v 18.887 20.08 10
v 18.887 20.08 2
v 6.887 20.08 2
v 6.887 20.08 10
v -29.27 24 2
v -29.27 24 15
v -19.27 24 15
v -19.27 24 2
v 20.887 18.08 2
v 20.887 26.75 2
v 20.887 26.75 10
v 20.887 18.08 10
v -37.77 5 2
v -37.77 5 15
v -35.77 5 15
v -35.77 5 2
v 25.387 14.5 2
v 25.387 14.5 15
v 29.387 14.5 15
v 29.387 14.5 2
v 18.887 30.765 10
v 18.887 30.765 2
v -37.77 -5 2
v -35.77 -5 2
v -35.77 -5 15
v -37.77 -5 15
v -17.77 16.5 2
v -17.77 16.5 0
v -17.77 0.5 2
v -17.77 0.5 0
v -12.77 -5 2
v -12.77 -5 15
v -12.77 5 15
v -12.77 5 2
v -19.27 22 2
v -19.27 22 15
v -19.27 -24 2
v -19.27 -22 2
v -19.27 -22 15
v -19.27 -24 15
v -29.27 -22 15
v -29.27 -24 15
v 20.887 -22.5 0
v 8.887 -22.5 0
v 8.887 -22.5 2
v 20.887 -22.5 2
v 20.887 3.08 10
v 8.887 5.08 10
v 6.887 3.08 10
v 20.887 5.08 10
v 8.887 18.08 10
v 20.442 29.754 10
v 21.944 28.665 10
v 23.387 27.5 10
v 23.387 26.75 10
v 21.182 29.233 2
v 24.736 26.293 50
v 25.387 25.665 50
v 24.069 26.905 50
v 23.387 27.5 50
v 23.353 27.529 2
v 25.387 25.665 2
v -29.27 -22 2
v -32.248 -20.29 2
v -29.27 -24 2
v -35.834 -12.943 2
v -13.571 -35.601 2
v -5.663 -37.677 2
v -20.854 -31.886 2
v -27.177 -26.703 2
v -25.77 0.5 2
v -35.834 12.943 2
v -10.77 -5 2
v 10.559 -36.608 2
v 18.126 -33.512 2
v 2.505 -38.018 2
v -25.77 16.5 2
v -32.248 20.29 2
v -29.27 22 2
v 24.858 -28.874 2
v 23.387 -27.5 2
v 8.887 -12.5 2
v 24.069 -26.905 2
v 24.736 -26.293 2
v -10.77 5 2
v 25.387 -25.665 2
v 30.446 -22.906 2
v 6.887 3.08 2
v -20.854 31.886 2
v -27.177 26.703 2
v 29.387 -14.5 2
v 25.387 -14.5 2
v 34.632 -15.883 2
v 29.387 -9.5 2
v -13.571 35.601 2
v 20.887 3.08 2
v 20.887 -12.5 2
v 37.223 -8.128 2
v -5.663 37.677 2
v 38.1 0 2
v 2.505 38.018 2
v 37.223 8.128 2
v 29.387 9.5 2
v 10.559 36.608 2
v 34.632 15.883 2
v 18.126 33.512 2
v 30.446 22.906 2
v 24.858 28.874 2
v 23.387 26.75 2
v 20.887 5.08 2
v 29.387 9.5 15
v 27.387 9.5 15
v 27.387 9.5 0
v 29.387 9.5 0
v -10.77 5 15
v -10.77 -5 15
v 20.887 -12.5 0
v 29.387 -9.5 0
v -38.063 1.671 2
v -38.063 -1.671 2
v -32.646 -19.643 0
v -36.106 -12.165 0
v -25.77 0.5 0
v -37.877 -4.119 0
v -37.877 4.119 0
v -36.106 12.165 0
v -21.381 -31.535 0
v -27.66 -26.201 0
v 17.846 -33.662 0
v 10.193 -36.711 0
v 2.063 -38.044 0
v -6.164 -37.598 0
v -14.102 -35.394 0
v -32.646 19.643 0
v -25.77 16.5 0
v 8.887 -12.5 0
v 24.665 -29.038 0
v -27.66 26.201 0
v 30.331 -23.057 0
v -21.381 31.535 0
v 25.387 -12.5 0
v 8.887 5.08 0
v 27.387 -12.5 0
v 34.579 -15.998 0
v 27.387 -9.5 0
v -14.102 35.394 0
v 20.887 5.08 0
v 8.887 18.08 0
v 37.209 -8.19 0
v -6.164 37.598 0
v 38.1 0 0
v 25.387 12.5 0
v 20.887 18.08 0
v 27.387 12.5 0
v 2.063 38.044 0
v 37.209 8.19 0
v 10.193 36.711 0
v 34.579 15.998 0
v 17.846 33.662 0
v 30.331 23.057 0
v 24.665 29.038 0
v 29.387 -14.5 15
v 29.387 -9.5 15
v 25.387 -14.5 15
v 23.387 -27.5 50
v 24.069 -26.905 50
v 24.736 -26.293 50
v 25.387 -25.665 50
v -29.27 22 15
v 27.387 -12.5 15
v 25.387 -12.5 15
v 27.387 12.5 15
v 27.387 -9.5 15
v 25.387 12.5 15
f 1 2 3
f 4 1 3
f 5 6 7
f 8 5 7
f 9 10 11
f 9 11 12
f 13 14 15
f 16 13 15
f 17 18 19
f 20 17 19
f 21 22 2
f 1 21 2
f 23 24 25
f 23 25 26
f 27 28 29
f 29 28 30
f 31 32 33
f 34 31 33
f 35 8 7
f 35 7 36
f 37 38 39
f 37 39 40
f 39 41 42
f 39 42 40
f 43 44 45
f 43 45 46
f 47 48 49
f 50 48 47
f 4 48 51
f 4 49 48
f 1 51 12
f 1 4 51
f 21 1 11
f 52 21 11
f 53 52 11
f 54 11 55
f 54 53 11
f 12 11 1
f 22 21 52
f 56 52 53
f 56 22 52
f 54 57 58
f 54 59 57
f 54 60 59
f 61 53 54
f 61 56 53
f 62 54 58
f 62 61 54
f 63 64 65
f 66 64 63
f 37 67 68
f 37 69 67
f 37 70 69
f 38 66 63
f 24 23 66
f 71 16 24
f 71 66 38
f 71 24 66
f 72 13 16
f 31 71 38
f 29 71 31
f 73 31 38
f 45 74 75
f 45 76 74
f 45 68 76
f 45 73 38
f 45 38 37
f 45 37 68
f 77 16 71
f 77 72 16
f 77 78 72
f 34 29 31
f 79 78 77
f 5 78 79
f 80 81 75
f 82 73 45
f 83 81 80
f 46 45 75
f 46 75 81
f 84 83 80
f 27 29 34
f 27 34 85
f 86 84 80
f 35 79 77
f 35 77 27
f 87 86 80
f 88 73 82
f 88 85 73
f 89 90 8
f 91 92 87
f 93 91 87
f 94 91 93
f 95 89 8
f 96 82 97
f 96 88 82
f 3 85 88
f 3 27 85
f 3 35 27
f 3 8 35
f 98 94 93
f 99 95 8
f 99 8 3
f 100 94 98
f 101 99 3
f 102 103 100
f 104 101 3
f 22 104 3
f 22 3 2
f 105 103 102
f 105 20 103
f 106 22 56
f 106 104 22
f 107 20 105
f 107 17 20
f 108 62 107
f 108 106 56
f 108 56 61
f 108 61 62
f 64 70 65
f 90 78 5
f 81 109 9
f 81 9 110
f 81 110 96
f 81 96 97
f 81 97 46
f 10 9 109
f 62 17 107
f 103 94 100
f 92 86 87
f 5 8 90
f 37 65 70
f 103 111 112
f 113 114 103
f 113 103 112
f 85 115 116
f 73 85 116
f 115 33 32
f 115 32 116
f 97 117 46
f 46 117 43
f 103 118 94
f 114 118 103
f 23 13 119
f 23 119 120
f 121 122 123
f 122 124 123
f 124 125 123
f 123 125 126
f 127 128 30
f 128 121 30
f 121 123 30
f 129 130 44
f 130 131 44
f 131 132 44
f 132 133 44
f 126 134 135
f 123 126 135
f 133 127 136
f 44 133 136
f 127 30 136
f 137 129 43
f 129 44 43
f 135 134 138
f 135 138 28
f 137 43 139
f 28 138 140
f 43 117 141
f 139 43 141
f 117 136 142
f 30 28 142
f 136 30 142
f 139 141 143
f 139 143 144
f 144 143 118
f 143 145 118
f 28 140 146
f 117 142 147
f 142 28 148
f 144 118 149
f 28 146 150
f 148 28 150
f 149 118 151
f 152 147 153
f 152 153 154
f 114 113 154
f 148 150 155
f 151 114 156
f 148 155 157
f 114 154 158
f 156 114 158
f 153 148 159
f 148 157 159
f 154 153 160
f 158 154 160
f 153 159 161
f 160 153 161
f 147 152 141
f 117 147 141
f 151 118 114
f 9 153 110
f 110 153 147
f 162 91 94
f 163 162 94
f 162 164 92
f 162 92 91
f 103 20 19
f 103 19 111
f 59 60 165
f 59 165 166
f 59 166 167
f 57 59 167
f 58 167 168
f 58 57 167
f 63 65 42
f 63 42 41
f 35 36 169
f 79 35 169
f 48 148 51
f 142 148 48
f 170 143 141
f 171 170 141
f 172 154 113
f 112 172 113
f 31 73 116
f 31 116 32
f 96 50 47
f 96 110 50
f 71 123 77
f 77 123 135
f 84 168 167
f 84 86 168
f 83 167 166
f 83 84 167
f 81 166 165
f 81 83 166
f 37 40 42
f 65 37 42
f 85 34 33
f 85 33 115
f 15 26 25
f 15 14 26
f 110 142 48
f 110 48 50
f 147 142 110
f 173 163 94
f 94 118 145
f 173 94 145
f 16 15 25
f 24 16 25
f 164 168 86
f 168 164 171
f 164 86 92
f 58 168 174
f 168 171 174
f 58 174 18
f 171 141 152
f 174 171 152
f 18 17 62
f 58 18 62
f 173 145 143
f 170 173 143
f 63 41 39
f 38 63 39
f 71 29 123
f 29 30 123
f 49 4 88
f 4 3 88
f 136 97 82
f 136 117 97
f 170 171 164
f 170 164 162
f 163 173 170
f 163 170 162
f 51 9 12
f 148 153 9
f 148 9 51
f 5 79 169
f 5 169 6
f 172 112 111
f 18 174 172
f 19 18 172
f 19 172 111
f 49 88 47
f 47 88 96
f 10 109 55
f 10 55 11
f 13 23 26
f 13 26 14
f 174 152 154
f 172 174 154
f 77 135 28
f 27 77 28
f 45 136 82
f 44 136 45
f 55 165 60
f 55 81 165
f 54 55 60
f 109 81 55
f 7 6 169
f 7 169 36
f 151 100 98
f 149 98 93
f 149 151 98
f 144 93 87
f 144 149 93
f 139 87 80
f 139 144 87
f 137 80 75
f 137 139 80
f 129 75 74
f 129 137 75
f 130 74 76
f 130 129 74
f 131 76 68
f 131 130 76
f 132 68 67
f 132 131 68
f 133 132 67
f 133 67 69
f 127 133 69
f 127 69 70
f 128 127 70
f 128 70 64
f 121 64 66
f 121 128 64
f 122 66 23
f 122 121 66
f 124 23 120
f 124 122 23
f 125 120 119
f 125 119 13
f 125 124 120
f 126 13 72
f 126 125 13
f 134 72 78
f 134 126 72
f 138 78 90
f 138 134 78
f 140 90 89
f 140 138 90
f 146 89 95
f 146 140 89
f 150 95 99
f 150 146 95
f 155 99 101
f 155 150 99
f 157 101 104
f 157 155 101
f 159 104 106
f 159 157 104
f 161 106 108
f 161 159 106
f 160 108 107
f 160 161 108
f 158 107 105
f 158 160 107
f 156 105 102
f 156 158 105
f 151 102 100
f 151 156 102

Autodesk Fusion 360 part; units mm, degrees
sketch "Sketch1" plane through (0, 0, 0) normal (0, 0, 1) x (1, 0, 0)
  circle A0 centre (0, 0) radius 38.1
  circle A1 centre (0, 0) radius 36.1
  line L0 (23.3872, -27.5) -> (23.3872, 27.5)
  line L1 (25.3872, -25.6652) -> (25.3872, 25.6652)
  line L2 (25.3872, 12.5) -> (27.3872, 12.5)
  line L3 (27.3872, 12.5) -> (27.3872, -12.5)
  line L4 (27.3872, -12.5) -> (25.3872, -12.5)
  line L5 (25.3872, -12.5) -> (25.3872, 12.5)
  line L6 (25.3872, 14.5) -> (29.3872, 14.5)
  line L7 (29.3872, 14.5) -> (29.3872, 9.5)
  line L8 (29.3872, 9.5) -> (27.3872, 9.5)
  line L9 (25.3872, -14.5) -> (29.3872, -14.5)
  line L10 (29.3872, -14.5) -> (29.3872, -9.5)
  line L11 (29.3872, -9.5) -> (27.3872, -9.5)
  line L12 (1.75, 0) -> (22.5, 0)
  line L13 (23.3872, 26.75) -> (20.8872, 26.75)
  line L14 (20.8872, 26.75) -> (20.8872, -26.75)
  line L15 (20.8872, -26.75) -> (23.3872, -26.75)
  line L16 (23.3872, -26.75) -> (23.3872, 26.75)
  line L17 (20.8872, 18.08) -> (8.8872, 18.08)
  line L18 (8.8872, 18.08) -> (8.8872, 5.08)
  line L19 (8.8872, 5.08) -> (20.8872, 5.08)
  line L20 (20.8872, 5.08) -> (20.8872, 18.08)
  line L21 (20.8872, -12.5) -> (8.8872, -12.5)
  line L22 (8.8872, -12.5) -> (8.8872, -22.5)
  line L23 (8.8872, -22.5) -> (20.8872, -22.5)
  line L24 (20.8872, -22.5) -> (20.8872, -12.5)
  line L25 (29.3872, -9.5) -> (29.3872, 9.5)
  line L26 (0, -38.1) -> (0, 38.1) construction
  line L27 (-38.1, 0) -> (38.1, 0) construction
  line L28 (26.9408, -26.9408) -> (-26.9408, 26.9408) construction
  line L29 (26.9408, 26.9408) -> (-26.9408, -26.9408) construction
  line L30 (0, 36.1) -> (0, 38.1)
  line L31 (-25.5266, 25.5266) -> (-26.9408, 26.9408)
  line L32 (-36.1, 0) -> (-38.1, 0)
  line L33 (-26.9408, -26.9408) -> (-25.5266, -25.5266)
  line L34 (0, -38.1) -> (0, -36.1)
  line L35 (26.9408, -26.9408) -> (25.5266, -25.5266)
  line L36 (38.1, 0) -> (36.1, 0)
  line L37 (26.9408, 26.9408) -> (25.5266, 25.5266)
  line L38 (18.8872, 30.765) -> (18.8872, 20.08)
  line L39 (18.8872, 20.08) -> (6.8872, 20.08)
  line L40 (6.8872, 20.08) -> (6.8872, 3.08)
  line L41 (6.8872, 3.08) -> (20.8872, 3.08)
  line L42 (-37.7705, 5) -> (-35.7705, 5)
  line L43 (-35.7705, 5) -> (-35.7705, -5)
  line L44 (-35.7705, -5) -> (-37.7705, -5)
  line L45 (-37.7705, -5) -> (-37.7705, 5)
  line L46 (-12.7705, 5) -> (-10.7705, 5)
  line L47 (-10.7705, 5) -> (-10.7705, -5)
  line L48 (-10.7705, -5) -> (-12.7705, -5)
  line L49 (-12.7705, -5) -> (-12.7705, 5)
  line L50 (-29.2705, 24) -> (-19.2705, 24)
  line L51 (-19.2705, 24) -> (-19.2705, 22)
  line L52 (-19.2705, 22) -> (-29.2705, 22)
  line L53 (-29.2705, 22) -> (-29.2705, 24)
  line L54 (-29.2705, -22) -> (-19.2705, -22)
  line L55 (-19.2705, -22) -> (-19.2705, -24)
  line L56 (-19.2705, -24) -> (-29.2705, -24)
  line L57 (-29.2705, -24) -> (-29.2705, -22)
  line L58 (-25.7705, 16.5) -> (-17.7705, 16.5)
  line L59 (-17.7705, 16.5) -> (-17.7705, 0.5)
  line L60 (-17.7705, 0.5) -> (-25.7705, 0.5)
  line L61 (-25.7705, 0.5) -> (-25.7705, 16.5)
  point P0 (27.3872, 0)
  point P1 (20.8872, 0)
  point P2 (-33.5, 0)
  point P3 (-20, 24)
  point P4 (-35.7705, 0)
  point P5 (-24.2705, 0)
  point P6 (-24.2705, 22)
  dimension "d1" = 76.2
  dimension "d2" = 2
  dimension "d3" = 55
  dimension "d4" = 2
  dimension "d5" = 2
  dimension "d6" = 2
  dimension "d7" = 2
  dimension "d8" = 3
  dimension "d9" = 25
  dimension "d10" = 2
  dimension "d11" = 2.5
  dimension "d12" = 53.5
  dimension "d13" = 13
  dimension "d14" = 12
  dimension "d15" = 8.67
  dimension "d16" = 10
  dimension "d17" = 12
  dimension "d18" = 4.25
  dimension "d23" = 45
  dimension "d27" = 2
  dimension "d28" = 2
  dimension "d29" = 2
  dimension "d30" = 2
  dimension "d45" = 10
  dimension "d46" = 2
  dimension "d47" = 11.5
  dimension "d48" = 11.5
  dimension "d49" = 22
  dimension "d50" = 22
  dimension "d51" = 16
  dimension "d52" = 8
  dimension "d53" = 1.5
  dimension "d54" = 5.5
extrude "Extrude1" add sketch "Sketch1" along normal blind 2 contours A0 A1 L36 L37 | A0 A1 L35 L36 | A0 A1 L30 L37 | A0 A1 L34 L35 | A1 L1 L6 L7 L9 L10 L25 | A0 A1 L30 L31 | A0 A1 L33 L34 | A0 A1 L31 L42 L43 L50 L52 L53 | A1 L0 L14 L15 L21 L22 L23 L38 L39 L40 L41 L43 L50 L51 L52 L54 L55 L56 | A0 A1 L33 L43 L44 L54 L56 L57 | A0 L32 L45 | A1 L32 L42 L43 L45 | A1 L0 L13 L14 L17 L18 L19 L38 L39 L40 L41 | A1 L32 L43 L44 L45 | A0 L32 L45 | A1 L50 L51 L52 | A1 L50 L52 L53 | L0 L13 L14 L15 L16 L20 L24 | A1 L54 L56 L57 | A1 L54 L55 L56 | A1 L43 | L46 L47 L48 L49
extrude "Extrude4" add sketch "Sketch1" along normal blind 10 contours A1 L0 L13 L14 L17 L18 L19 L38 L39 L40 L41
extrude "Extrude6" add sketch "Sketch1" along normal blind 50 contours A1 L0 L1 L5 L16
extrude "Extrude7" add sketch "Sketch1" along normal blind 15 contours A1 L32 L42 L43 L45 | L1 L2 L3 L6 L7 L8 | A1 L32 L43 L44 L45 | L1 L3 L4 L9 L10 L11 | A1 L50 L51 L52 | A1 L50 L52 L53 | A1 L54 L56 L57 | A1 L54 L55 L56 | A1 L43 | L46 L47 L48 L49
equation "d47 = ( 23 / 2 ) * 1 mm"
